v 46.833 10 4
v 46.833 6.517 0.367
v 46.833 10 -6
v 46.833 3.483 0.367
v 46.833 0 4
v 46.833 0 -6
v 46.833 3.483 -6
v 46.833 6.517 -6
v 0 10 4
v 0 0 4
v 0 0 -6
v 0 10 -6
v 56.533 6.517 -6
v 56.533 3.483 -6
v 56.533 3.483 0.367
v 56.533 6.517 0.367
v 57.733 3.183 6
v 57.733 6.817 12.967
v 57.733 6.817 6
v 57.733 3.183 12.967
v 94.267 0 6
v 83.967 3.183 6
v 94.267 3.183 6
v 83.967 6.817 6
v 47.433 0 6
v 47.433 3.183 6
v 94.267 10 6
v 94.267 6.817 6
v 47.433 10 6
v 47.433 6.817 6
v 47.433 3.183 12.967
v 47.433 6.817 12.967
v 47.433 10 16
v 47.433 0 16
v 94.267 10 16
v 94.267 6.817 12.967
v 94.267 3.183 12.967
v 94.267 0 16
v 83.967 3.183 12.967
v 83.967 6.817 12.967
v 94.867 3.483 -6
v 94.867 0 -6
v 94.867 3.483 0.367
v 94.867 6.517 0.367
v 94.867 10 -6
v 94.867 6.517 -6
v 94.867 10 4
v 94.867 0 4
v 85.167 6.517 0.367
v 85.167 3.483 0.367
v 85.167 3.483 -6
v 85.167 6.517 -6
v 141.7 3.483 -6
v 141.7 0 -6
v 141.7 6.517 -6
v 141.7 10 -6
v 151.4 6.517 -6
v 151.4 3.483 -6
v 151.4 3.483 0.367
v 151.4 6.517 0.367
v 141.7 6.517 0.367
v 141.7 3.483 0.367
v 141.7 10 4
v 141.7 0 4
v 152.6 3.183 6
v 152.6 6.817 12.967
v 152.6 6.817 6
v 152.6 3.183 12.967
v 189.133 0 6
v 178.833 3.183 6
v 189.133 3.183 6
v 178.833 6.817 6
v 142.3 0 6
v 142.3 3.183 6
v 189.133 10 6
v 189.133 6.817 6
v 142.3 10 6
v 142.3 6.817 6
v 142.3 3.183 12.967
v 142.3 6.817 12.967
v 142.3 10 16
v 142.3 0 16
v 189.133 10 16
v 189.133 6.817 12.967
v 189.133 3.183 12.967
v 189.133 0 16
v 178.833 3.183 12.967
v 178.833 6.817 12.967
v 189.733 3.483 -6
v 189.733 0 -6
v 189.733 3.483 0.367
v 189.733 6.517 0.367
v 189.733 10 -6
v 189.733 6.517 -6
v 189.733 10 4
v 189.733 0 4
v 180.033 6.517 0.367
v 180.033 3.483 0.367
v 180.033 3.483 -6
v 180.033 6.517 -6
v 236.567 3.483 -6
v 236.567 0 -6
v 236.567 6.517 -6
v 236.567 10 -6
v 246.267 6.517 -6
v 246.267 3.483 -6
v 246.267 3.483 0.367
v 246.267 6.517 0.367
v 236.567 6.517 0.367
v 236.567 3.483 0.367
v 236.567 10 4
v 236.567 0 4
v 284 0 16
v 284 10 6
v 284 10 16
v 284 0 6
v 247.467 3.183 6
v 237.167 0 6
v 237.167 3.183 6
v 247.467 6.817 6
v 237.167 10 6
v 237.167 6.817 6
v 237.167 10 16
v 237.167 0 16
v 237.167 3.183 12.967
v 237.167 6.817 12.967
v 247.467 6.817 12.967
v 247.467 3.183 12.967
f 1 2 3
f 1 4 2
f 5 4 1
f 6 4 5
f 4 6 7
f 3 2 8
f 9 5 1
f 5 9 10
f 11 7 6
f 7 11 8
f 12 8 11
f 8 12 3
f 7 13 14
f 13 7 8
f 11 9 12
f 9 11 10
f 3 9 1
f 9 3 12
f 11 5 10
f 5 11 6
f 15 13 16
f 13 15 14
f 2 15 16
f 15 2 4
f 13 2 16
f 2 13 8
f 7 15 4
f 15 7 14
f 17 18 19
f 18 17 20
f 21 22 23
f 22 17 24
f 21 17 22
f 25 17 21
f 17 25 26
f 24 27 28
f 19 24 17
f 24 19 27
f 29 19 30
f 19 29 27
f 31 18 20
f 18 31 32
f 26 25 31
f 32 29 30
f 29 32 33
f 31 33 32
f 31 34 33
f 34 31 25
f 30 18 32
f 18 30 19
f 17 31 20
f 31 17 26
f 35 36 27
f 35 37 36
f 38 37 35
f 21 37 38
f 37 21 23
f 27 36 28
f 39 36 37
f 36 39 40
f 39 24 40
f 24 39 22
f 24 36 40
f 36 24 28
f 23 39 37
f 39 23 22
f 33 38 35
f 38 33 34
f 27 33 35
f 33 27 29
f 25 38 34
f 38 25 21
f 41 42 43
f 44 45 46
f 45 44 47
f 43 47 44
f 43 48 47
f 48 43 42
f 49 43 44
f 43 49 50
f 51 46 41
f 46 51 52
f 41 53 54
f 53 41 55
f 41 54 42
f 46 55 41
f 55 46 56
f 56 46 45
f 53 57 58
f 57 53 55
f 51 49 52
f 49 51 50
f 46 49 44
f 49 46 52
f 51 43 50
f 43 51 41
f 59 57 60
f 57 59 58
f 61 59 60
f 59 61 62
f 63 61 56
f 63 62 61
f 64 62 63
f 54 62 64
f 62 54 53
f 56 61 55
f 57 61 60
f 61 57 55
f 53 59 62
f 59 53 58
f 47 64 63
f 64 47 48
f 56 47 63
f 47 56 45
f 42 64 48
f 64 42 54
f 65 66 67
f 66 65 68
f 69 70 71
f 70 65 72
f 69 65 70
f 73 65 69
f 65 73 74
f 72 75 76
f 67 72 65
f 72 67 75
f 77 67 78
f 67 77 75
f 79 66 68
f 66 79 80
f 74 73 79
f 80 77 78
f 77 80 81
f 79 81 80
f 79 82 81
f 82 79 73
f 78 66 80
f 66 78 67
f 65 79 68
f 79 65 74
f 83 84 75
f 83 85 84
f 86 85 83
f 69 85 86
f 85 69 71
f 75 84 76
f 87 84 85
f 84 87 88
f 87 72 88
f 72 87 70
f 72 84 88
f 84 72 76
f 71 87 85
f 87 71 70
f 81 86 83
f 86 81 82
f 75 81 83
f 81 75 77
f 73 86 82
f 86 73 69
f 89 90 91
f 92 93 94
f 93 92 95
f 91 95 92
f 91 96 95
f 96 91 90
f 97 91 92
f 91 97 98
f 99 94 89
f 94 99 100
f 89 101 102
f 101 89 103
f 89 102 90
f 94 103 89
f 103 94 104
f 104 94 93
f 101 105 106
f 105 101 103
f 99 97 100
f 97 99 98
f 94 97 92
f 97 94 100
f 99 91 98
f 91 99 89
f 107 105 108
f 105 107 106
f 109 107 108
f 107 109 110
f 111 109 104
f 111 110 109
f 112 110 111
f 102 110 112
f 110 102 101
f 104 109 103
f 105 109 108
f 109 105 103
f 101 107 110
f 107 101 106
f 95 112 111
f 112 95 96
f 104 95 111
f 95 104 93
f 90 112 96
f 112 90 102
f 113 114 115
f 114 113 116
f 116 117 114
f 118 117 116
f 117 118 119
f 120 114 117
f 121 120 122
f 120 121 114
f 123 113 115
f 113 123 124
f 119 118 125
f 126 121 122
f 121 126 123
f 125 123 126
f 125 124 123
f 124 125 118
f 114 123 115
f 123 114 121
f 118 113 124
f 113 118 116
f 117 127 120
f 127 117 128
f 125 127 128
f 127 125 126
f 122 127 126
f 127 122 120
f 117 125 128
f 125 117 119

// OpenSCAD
ASSEMBLED = "ASSEMBLED";
PRINT_READY = "PRINT_READY";

module guard(
  length,
  max_length,
  thickness,
  explode,
  layout = ASSEMBLED,
) {
  effective_explode = explode == undef ? thickness * 0.6 : explode;
  segment_count = ceil(length / max_length);
  segment_length = length / segment_count - $tolerance * (segment_count - 1);
  module segment(args) guard_segment(segment_length, thickness, args[0], args[1], args[2]);

  for (i = [0:segment_count-1]) {
    is_male = i % 2 == 0;
    args = [is_male ? MALE : FEMALE, i != 0, i != segment_count - 1];

    if (layout == ASSEMBLED)
      translate([i*(segment_length + $tolerance), 0, 0])
        if (is_male) {
          translate([0, 0, -effective_explode])
            segment(args);
        } else {
          translate([0, 0, thickness + effective_explode])
            mirror([0, 0, 1])
              segment(args);
        }

    if (layout == PRINT_READY)
      translate([0, i*(thickness + 5)])
        segment(args);
  }
}

MALE = "MALE";
FEMALE = "FEMALE";

module guard_segment(
  length, // How long the part should be _excluding_ any male connections
  thickness,
  type, // MALE or FEMALE
  include_left_joint,
  include_right_joint,
) {
  difference() {
    cube([length, thickness, thickness]);
    if (type == FEMALE) {
      if (include_left_joint)
        translate([0, thickness/3 - $tolerance/4, thickness/3 - $tolerance/2])
          cube([thickness + $tolerance/2, thickness/3 + $tolerance/2, 2*thickness/3 + $tolerance/2]);
      if (include_right_joint)
        translate([length - thickness - $tolerance/2, thickness/3 - $tolerance/4, thickness/3 - $tolerance/2])
          cube([thickness + $tolerance/2, thickness/3 + $tolerance/2, 2*thickness/3 + $tolerance/2]);
    }
  }
  if (type == MALE) {
    if (include_left_joint)
      translate([-thickness + $tolerance/2, thickness/3 + $tolerance/4, 0])
        cube([thickness - $tolerance/2, thickness/3 - $tolerance/2, 2*thickness/3 - $tolerance/2]);
    if (include_right_joint)
      translate([length, thickness/3 + $tolerance/4, 0])
        cube([thickness - $tolerance/2, thickness/3 - $tolerance/2, 2*thickness/3 - $tolerance/2]);
  }
}

guard(299, 50, 10, $tolerance = 0.6);
